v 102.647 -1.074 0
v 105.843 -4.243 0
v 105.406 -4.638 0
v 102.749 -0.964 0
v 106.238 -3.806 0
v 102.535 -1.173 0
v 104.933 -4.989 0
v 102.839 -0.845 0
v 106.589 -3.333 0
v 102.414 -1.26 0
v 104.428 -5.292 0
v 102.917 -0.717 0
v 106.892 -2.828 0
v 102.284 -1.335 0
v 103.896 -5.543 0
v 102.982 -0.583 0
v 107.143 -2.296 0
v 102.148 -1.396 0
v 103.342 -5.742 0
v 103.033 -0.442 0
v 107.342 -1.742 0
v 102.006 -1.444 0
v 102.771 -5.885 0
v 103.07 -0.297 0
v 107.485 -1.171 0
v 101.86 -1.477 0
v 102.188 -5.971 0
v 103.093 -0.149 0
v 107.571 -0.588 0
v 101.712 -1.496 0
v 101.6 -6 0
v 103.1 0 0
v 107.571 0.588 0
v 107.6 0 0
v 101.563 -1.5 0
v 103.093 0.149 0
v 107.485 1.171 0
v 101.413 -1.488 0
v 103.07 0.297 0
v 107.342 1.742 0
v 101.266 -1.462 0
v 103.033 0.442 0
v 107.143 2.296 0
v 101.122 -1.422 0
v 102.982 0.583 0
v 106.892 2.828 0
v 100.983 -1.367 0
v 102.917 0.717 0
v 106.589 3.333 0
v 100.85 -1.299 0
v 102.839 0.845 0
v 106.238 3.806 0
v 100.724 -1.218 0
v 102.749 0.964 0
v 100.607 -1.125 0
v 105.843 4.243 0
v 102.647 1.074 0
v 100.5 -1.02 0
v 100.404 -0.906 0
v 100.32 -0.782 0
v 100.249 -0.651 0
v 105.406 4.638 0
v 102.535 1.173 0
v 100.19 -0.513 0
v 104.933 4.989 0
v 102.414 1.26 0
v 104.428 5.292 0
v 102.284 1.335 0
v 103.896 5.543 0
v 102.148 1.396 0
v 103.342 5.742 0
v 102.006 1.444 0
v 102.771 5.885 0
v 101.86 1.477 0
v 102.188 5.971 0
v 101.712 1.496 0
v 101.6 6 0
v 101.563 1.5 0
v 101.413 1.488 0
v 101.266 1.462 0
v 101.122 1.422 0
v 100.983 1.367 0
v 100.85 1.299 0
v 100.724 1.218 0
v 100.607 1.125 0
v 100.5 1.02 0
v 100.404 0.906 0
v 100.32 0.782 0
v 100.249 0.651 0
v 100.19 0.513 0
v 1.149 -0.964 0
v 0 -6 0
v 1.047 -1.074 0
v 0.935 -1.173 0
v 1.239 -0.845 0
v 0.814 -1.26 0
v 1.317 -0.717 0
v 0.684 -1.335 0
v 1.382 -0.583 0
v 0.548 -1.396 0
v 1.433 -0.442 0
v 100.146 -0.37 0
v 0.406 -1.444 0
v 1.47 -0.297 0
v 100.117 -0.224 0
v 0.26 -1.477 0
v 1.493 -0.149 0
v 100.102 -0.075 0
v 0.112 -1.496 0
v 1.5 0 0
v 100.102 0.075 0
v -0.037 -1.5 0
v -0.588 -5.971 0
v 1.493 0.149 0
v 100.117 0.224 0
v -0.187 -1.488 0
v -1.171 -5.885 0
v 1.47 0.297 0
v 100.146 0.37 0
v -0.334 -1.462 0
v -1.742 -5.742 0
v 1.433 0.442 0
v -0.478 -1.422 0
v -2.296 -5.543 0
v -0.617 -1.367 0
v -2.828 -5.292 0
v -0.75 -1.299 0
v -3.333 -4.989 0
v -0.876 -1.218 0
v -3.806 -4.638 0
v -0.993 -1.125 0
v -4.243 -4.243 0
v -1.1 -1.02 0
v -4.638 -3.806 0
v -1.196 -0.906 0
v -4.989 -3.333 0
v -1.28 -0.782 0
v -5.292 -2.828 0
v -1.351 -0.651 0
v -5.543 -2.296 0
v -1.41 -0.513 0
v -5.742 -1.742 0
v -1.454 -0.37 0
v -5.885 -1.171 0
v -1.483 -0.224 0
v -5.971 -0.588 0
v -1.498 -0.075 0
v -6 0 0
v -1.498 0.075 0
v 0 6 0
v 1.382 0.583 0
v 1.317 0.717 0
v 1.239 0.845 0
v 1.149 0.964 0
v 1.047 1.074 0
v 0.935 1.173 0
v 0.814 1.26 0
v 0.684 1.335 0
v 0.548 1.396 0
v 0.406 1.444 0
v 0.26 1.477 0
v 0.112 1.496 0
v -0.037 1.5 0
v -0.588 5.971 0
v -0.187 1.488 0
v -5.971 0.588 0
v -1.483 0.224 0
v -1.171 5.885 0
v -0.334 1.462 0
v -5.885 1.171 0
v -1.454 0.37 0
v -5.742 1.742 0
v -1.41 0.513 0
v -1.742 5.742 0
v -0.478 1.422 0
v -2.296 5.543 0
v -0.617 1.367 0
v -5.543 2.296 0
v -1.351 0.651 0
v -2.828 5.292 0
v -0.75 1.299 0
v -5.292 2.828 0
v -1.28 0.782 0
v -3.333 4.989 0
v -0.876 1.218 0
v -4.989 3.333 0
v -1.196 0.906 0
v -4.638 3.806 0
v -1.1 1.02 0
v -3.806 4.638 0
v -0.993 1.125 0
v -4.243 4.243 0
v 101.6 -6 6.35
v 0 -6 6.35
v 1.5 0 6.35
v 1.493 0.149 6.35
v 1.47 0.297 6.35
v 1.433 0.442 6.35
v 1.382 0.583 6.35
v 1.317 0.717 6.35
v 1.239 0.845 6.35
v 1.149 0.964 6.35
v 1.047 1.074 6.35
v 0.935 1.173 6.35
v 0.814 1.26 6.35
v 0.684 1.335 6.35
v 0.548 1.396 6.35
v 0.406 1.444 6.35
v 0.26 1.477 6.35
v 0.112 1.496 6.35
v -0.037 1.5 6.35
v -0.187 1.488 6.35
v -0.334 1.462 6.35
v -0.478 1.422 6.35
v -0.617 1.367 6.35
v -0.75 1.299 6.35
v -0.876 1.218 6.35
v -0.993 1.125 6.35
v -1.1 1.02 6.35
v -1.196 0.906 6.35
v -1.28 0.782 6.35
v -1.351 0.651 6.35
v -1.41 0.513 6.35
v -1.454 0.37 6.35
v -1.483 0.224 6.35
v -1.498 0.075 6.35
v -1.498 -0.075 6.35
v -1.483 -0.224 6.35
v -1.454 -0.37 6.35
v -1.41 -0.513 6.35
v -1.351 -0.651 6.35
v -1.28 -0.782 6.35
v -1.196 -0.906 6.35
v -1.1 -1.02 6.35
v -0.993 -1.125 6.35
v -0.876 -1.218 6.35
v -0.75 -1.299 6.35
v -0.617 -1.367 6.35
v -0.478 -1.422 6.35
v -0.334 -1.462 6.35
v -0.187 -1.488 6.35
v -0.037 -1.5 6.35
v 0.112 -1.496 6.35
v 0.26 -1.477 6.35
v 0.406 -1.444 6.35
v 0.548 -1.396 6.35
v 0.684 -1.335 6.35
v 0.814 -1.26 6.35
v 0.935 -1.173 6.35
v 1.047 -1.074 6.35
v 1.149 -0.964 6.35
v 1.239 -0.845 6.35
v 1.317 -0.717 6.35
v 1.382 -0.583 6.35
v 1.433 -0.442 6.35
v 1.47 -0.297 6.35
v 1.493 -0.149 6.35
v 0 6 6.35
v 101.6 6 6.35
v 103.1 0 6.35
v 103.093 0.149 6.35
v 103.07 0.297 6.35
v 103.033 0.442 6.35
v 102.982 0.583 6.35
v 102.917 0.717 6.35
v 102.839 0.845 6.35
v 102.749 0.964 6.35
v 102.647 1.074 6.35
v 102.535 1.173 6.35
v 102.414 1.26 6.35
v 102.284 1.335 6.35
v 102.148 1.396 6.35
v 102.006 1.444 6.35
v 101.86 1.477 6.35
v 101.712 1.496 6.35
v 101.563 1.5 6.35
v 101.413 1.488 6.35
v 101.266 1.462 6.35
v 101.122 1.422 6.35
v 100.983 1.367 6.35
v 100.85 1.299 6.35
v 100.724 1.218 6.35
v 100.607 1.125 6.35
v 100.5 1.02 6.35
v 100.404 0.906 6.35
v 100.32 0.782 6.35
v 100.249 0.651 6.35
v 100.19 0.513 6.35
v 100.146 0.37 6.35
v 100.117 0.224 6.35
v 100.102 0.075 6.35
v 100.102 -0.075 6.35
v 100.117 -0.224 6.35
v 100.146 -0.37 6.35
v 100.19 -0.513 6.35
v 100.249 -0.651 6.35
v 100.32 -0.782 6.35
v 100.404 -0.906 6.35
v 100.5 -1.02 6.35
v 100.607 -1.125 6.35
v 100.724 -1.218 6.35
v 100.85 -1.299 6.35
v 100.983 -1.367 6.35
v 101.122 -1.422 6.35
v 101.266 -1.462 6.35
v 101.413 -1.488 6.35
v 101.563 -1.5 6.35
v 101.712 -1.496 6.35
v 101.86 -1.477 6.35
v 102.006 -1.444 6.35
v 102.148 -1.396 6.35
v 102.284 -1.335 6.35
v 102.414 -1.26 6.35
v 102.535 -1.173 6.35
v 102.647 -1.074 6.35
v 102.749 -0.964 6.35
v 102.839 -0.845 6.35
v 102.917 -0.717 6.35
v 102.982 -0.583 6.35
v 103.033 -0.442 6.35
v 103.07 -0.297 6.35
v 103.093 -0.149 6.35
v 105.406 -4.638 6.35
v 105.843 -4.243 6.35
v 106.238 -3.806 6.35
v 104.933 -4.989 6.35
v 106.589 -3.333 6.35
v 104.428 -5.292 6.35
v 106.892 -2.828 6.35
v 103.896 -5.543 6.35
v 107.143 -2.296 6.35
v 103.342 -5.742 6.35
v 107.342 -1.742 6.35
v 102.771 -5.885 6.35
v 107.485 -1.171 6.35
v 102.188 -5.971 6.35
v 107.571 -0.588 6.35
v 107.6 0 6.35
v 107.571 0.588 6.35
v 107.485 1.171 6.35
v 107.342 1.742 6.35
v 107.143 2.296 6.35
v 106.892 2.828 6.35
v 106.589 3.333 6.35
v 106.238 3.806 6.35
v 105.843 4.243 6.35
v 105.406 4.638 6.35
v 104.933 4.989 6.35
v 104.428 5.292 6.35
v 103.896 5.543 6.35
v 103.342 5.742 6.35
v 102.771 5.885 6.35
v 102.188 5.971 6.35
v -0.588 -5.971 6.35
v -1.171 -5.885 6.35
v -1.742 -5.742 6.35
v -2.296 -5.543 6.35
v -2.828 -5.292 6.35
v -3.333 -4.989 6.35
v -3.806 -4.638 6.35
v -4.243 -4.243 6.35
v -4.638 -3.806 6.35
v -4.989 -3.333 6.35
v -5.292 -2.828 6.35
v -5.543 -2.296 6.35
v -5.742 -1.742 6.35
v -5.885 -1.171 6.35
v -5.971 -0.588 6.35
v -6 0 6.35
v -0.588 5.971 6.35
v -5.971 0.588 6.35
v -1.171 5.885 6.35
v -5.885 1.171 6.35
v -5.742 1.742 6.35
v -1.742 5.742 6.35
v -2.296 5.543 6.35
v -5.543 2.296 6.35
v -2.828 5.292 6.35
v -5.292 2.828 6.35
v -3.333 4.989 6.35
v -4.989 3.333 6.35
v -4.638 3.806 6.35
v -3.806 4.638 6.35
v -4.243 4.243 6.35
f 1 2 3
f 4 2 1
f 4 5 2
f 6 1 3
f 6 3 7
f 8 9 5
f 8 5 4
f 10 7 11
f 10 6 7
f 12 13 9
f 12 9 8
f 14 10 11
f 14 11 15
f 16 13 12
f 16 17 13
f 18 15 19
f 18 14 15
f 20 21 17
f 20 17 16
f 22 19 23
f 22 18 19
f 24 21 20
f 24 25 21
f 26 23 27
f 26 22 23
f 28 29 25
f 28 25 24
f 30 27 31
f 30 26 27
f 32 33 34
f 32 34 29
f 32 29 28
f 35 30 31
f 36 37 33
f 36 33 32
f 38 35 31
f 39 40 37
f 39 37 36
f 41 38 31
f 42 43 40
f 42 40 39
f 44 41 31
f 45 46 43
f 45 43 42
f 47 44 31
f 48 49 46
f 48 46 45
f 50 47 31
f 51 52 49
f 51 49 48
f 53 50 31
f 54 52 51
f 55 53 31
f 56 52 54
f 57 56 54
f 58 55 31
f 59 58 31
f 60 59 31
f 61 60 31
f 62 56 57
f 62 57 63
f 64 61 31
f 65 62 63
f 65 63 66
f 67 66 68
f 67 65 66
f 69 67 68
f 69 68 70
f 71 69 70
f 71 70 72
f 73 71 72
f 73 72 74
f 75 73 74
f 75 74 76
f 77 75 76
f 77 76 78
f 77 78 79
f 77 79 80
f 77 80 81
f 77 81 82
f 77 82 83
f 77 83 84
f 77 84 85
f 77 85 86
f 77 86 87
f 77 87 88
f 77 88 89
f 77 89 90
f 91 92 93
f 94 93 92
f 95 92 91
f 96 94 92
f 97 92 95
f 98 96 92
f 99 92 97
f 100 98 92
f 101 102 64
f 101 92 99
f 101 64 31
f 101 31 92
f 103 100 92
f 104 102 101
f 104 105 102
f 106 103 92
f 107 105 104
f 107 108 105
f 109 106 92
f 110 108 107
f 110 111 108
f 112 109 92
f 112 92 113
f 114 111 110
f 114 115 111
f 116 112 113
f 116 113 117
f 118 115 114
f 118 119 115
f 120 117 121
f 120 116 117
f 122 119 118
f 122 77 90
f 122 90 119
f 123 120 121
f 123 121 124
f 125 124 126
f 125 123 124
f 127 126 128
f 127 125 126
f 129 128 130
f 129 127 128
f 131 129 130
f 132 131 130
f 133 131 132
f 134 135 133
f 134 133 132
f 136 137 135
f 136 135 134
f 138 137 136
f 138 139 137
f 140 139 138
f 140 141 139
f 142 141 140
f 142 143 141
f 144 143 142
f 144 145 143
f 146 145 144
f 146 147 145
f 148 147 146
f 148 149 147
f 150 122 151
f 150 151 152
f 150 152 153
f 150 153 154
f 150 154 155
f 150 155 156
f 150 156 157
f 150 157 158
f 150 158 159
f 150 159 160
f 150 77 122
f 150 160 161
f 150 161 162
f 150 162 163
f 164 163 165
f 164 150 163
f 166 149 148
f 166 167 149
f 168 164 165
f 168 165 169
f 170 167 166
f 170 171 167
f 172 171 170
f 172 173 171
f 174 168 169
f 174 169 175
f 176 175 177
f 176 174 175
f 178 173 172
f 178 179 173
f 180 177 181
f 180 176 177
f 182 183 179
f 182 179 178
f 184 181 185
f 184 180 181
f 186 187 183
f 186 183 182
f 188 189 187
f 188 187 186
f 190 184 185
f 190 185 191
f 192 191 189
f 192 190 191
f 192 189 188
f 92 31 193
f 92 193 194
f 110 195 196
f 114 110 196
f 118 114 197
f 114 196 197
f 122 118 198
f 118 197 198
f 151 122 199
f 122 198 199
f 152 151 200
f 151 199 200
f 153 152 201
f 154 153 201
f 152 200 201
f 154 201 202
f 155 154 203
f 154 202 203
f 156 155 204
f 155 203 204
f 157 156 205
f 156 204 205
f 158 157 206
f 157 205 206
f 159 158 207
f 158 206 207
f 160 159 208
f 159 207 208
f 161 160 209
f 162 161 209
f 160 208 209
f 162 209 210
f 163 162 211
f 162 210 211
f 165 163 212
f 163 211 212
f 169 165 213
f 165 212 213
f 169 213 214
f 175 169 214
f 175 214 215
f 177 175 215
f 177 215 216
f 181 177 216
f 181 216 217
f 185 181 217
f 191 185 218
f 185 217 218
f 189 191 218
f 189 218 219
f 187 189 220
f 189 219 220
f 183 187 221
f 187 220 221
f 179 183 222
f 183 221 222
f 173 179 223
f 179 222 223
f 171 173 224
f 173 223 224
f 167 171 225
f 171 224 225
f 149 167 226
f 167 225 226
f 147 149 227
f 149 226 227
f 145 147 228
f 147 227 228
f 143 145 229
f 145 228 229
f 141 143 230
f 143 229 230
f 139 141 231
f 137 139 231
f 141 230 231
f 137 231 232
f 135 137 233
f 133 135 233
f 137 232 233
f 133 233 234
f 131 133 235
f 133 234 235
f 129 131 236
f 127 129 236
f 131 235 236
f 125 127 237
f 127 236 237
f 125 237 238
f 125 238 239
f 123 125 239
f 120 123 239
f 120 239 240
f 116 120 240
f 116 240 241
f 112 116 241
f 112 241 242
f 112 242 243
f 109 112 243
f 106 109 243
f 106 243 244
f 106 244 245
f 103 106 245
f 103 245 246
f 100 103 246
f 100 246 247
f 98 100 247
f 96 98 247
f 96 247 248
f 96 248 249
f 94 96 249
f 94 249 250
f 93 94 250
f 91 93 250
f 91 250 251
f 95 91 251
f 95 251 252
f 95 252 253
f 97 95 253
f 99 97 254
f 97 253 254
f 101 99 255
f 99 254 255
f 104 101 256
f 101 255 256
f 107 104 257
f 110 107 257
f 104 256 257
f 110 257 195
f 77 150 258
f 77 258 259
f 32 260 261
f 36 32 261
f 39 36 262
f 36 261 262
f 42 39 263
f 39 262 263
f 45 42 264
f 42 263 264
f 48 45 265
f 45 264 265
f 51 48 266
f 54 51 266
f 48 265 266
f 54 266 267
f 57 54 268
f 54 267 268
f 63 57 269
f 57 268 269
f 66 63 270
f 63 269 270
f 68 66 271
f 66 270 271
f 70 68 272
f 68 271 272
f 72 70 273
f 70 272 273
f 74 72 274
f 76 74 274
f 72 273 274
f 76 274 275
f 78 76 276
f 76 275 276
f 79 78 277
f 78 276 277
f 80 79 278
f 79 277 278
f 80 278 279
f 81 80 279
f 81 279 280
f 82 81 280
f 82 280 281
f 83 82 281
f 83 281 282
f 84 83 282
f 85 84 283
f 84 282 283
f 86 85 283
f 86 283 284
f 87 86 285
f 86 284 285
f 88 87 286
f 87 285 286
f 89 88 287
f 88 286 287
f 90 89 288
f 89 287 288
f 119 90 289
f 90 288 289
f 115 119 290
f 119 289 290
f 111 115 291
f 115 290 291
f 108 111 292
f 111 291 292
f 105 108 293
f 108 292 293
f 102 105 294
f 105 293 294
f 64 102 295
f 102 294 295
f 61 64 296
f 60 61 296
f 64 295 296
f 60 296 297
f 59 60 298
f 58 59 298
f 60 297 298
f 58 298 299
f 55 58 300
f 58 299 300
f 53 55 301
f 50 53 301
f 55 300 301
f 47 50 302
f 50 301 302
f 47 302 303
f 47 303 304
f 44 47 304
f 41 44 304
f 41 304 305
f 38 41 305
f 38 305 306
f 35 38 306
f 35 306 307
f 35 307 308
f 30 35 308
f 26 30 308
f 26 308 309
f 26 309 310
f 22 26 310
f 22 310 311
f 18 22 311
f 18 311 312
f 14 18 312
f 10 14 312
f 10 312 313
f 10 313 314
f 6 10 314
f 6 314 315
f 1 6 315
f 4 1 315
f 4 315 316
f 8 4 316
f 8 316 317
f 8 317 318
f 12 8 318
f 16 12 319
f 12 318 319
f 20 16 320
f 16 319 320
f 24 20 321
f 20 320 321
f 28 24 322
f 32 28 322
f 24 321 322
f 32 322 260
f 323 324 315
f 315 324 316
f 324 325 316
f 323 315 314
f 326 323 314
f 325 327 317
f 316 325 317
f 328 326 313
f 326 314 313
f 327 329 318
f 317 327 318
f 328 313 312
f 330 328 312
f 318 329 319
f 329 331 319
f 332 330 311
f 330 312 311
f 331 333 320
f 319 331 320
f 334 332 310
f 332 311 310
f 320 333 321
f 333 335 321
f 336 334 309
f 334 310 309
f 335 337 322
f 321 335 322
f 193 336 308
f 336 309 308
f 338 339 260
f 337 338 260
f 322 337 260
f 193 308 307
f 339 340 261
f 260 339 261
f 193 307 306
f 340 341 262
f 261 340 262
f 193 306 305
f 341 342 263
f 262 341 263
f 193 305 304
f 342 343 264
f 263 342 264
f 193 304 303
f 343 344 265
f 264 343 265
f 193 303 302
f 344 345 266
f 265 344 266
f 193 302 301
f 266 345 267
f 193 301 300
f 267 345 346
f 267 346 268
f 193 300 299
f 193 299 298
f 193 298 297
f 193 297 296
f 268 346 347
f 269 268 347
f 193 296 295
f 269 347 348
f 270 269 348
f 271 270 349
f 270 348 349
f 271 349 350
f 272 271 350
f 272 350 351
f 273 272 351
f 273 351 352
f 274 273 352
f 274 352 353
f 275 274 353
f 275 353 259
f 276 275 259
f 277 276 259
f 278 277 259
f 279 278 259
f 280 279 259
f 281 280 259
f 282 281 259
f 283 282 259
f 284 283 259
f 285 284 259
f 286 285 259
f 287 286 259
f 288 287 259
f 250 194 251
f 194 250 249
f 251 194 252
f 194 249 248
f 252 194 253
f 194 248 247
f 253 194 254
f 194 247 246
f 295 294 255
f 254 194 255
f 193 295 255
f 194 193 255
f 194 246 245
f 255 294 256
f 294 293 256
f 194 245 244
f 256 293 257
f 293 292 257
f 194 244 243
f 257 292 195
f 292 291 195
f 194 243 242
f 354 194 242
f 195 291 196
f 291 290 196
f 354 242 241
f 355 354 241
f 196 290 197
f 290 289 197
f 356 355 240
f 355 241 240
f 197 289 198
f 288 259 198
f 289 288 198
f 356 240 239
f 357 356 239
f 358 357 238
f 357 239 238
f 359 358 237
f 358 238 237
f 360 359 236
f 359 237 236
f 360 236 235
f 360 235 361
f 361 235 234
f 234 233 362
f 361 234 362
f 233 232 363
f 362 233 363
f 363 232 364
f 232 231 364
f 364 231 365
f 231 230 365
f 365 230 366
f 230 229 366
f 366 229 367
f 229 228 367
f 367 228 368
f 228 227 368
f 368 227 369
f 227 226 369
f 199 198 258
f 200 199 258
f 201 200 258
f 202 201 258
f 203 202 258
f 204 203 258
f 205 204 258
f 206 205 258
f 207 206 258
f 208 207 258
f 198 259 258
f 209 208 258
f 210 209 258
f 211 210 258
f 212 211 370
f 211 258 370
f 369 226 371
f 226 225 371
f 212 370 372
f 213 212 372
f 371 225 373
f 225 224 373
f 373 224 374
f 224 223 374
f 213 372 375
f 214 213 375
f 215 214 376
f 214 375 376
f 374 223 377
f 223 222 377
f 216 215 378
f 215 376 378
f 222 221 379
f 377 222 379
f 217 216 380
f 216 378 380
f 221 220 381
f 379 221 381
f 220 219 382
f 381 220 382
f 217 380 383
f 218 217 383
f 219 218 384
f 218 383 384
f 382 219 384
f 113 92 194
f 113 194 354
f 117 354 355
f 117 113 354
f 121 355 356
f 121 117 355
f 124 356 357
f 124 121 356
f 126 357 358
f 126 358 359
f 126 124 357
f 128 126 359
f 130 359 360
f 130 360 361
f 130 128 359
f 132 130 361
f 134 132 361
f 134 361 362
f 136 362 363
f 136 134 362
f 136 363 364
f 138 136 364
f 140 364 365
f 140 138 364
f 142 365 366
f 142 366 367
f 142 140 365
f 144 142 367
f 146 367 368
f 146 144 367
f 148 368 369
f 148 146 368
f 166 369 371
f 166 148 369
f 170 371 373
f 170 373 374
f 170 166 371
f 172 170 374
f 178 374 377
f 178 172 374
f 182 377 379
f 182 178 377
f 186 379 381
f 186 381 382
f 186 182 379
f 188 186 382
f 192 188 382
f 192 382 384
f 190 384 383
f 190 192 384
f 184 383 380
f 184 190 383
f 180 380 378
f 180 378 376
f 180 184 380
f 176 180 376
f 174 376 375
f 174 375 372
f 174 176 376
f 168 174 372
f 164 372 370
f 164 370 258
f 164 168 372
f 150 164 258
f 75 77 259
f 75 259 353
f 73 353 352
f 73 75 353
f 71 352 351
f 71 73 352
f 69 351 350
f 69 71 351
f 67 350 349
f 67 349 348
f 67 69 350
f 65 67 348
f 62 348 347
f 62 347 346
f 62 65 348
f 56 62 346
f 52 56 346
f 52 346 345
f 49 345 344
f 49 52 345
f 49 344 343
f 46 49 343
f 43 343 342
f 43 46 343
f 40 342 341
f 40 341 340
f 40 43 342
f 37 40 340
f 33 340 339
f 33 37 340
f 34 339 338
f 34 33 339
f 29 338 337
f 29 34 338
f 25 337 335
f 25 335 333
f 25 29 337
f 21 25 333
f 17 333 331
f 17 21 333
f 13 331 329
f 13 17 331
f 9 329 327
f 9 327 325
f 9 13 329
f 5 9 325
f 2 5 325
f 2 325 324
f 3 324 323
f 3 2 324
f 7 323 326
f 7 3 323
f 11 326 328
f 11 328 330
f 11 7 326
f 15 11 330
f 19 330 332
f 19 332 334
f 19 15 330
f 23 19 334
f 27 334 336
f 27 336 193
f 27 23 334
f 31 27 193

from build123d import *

# Parameters (mm, degrees)
BOSS_EXTRU_1_DEPTH      = 6.35
ESQUISSE2_R             = 1.5
ENL_V_MAT_EXTRU_1_DEPTH = 6.35
ESQUISSE3_R             = 1.5
ENL_V_MAT_EXTRU_2_DEPTH = 6.35


with BuildPart() as part:
    # Esquisse1 → Boss.-Extru.1 (new body)
    with BuildSketch(Plane.XY):
        with BuildLine():
            Line((0, 6), (101.6, 6))
            ThreePointArc((101.6, 6), (107.6, 0), (101.6, -6))
            Line((101.6, -6), (0, -6))
            ThreePointArc((0, -6), (-6, 0), (0, 6))
        make_face()
    extrude(amount=BOSS_EXTRU_1_DEPTH)

    # Esquisse2 → Enlèv. mat.-Extru.1 (cut)
    with BuildSketch(Plane.XY.offset(6.35)):
        Circle(ESQUISSE2_R)
    extrude(amount=-ENL_V_MAT_EXTRU_1_DEPTH, mode=Mode.SUBTRACT)

    # Esquisse3 → Enlèv. mat.-Extru.2 (cut)
    with BuildSketch(Plane.XY.offset(6.35)):
        with Locations((101.6, 0)):
            Circle(ESQUISSE3_R)
    extrude(amount=-ENL_V_MAT_EXTRU_2_DEPTH, mode=Mode.SUBTRACT)


solid = part.part
